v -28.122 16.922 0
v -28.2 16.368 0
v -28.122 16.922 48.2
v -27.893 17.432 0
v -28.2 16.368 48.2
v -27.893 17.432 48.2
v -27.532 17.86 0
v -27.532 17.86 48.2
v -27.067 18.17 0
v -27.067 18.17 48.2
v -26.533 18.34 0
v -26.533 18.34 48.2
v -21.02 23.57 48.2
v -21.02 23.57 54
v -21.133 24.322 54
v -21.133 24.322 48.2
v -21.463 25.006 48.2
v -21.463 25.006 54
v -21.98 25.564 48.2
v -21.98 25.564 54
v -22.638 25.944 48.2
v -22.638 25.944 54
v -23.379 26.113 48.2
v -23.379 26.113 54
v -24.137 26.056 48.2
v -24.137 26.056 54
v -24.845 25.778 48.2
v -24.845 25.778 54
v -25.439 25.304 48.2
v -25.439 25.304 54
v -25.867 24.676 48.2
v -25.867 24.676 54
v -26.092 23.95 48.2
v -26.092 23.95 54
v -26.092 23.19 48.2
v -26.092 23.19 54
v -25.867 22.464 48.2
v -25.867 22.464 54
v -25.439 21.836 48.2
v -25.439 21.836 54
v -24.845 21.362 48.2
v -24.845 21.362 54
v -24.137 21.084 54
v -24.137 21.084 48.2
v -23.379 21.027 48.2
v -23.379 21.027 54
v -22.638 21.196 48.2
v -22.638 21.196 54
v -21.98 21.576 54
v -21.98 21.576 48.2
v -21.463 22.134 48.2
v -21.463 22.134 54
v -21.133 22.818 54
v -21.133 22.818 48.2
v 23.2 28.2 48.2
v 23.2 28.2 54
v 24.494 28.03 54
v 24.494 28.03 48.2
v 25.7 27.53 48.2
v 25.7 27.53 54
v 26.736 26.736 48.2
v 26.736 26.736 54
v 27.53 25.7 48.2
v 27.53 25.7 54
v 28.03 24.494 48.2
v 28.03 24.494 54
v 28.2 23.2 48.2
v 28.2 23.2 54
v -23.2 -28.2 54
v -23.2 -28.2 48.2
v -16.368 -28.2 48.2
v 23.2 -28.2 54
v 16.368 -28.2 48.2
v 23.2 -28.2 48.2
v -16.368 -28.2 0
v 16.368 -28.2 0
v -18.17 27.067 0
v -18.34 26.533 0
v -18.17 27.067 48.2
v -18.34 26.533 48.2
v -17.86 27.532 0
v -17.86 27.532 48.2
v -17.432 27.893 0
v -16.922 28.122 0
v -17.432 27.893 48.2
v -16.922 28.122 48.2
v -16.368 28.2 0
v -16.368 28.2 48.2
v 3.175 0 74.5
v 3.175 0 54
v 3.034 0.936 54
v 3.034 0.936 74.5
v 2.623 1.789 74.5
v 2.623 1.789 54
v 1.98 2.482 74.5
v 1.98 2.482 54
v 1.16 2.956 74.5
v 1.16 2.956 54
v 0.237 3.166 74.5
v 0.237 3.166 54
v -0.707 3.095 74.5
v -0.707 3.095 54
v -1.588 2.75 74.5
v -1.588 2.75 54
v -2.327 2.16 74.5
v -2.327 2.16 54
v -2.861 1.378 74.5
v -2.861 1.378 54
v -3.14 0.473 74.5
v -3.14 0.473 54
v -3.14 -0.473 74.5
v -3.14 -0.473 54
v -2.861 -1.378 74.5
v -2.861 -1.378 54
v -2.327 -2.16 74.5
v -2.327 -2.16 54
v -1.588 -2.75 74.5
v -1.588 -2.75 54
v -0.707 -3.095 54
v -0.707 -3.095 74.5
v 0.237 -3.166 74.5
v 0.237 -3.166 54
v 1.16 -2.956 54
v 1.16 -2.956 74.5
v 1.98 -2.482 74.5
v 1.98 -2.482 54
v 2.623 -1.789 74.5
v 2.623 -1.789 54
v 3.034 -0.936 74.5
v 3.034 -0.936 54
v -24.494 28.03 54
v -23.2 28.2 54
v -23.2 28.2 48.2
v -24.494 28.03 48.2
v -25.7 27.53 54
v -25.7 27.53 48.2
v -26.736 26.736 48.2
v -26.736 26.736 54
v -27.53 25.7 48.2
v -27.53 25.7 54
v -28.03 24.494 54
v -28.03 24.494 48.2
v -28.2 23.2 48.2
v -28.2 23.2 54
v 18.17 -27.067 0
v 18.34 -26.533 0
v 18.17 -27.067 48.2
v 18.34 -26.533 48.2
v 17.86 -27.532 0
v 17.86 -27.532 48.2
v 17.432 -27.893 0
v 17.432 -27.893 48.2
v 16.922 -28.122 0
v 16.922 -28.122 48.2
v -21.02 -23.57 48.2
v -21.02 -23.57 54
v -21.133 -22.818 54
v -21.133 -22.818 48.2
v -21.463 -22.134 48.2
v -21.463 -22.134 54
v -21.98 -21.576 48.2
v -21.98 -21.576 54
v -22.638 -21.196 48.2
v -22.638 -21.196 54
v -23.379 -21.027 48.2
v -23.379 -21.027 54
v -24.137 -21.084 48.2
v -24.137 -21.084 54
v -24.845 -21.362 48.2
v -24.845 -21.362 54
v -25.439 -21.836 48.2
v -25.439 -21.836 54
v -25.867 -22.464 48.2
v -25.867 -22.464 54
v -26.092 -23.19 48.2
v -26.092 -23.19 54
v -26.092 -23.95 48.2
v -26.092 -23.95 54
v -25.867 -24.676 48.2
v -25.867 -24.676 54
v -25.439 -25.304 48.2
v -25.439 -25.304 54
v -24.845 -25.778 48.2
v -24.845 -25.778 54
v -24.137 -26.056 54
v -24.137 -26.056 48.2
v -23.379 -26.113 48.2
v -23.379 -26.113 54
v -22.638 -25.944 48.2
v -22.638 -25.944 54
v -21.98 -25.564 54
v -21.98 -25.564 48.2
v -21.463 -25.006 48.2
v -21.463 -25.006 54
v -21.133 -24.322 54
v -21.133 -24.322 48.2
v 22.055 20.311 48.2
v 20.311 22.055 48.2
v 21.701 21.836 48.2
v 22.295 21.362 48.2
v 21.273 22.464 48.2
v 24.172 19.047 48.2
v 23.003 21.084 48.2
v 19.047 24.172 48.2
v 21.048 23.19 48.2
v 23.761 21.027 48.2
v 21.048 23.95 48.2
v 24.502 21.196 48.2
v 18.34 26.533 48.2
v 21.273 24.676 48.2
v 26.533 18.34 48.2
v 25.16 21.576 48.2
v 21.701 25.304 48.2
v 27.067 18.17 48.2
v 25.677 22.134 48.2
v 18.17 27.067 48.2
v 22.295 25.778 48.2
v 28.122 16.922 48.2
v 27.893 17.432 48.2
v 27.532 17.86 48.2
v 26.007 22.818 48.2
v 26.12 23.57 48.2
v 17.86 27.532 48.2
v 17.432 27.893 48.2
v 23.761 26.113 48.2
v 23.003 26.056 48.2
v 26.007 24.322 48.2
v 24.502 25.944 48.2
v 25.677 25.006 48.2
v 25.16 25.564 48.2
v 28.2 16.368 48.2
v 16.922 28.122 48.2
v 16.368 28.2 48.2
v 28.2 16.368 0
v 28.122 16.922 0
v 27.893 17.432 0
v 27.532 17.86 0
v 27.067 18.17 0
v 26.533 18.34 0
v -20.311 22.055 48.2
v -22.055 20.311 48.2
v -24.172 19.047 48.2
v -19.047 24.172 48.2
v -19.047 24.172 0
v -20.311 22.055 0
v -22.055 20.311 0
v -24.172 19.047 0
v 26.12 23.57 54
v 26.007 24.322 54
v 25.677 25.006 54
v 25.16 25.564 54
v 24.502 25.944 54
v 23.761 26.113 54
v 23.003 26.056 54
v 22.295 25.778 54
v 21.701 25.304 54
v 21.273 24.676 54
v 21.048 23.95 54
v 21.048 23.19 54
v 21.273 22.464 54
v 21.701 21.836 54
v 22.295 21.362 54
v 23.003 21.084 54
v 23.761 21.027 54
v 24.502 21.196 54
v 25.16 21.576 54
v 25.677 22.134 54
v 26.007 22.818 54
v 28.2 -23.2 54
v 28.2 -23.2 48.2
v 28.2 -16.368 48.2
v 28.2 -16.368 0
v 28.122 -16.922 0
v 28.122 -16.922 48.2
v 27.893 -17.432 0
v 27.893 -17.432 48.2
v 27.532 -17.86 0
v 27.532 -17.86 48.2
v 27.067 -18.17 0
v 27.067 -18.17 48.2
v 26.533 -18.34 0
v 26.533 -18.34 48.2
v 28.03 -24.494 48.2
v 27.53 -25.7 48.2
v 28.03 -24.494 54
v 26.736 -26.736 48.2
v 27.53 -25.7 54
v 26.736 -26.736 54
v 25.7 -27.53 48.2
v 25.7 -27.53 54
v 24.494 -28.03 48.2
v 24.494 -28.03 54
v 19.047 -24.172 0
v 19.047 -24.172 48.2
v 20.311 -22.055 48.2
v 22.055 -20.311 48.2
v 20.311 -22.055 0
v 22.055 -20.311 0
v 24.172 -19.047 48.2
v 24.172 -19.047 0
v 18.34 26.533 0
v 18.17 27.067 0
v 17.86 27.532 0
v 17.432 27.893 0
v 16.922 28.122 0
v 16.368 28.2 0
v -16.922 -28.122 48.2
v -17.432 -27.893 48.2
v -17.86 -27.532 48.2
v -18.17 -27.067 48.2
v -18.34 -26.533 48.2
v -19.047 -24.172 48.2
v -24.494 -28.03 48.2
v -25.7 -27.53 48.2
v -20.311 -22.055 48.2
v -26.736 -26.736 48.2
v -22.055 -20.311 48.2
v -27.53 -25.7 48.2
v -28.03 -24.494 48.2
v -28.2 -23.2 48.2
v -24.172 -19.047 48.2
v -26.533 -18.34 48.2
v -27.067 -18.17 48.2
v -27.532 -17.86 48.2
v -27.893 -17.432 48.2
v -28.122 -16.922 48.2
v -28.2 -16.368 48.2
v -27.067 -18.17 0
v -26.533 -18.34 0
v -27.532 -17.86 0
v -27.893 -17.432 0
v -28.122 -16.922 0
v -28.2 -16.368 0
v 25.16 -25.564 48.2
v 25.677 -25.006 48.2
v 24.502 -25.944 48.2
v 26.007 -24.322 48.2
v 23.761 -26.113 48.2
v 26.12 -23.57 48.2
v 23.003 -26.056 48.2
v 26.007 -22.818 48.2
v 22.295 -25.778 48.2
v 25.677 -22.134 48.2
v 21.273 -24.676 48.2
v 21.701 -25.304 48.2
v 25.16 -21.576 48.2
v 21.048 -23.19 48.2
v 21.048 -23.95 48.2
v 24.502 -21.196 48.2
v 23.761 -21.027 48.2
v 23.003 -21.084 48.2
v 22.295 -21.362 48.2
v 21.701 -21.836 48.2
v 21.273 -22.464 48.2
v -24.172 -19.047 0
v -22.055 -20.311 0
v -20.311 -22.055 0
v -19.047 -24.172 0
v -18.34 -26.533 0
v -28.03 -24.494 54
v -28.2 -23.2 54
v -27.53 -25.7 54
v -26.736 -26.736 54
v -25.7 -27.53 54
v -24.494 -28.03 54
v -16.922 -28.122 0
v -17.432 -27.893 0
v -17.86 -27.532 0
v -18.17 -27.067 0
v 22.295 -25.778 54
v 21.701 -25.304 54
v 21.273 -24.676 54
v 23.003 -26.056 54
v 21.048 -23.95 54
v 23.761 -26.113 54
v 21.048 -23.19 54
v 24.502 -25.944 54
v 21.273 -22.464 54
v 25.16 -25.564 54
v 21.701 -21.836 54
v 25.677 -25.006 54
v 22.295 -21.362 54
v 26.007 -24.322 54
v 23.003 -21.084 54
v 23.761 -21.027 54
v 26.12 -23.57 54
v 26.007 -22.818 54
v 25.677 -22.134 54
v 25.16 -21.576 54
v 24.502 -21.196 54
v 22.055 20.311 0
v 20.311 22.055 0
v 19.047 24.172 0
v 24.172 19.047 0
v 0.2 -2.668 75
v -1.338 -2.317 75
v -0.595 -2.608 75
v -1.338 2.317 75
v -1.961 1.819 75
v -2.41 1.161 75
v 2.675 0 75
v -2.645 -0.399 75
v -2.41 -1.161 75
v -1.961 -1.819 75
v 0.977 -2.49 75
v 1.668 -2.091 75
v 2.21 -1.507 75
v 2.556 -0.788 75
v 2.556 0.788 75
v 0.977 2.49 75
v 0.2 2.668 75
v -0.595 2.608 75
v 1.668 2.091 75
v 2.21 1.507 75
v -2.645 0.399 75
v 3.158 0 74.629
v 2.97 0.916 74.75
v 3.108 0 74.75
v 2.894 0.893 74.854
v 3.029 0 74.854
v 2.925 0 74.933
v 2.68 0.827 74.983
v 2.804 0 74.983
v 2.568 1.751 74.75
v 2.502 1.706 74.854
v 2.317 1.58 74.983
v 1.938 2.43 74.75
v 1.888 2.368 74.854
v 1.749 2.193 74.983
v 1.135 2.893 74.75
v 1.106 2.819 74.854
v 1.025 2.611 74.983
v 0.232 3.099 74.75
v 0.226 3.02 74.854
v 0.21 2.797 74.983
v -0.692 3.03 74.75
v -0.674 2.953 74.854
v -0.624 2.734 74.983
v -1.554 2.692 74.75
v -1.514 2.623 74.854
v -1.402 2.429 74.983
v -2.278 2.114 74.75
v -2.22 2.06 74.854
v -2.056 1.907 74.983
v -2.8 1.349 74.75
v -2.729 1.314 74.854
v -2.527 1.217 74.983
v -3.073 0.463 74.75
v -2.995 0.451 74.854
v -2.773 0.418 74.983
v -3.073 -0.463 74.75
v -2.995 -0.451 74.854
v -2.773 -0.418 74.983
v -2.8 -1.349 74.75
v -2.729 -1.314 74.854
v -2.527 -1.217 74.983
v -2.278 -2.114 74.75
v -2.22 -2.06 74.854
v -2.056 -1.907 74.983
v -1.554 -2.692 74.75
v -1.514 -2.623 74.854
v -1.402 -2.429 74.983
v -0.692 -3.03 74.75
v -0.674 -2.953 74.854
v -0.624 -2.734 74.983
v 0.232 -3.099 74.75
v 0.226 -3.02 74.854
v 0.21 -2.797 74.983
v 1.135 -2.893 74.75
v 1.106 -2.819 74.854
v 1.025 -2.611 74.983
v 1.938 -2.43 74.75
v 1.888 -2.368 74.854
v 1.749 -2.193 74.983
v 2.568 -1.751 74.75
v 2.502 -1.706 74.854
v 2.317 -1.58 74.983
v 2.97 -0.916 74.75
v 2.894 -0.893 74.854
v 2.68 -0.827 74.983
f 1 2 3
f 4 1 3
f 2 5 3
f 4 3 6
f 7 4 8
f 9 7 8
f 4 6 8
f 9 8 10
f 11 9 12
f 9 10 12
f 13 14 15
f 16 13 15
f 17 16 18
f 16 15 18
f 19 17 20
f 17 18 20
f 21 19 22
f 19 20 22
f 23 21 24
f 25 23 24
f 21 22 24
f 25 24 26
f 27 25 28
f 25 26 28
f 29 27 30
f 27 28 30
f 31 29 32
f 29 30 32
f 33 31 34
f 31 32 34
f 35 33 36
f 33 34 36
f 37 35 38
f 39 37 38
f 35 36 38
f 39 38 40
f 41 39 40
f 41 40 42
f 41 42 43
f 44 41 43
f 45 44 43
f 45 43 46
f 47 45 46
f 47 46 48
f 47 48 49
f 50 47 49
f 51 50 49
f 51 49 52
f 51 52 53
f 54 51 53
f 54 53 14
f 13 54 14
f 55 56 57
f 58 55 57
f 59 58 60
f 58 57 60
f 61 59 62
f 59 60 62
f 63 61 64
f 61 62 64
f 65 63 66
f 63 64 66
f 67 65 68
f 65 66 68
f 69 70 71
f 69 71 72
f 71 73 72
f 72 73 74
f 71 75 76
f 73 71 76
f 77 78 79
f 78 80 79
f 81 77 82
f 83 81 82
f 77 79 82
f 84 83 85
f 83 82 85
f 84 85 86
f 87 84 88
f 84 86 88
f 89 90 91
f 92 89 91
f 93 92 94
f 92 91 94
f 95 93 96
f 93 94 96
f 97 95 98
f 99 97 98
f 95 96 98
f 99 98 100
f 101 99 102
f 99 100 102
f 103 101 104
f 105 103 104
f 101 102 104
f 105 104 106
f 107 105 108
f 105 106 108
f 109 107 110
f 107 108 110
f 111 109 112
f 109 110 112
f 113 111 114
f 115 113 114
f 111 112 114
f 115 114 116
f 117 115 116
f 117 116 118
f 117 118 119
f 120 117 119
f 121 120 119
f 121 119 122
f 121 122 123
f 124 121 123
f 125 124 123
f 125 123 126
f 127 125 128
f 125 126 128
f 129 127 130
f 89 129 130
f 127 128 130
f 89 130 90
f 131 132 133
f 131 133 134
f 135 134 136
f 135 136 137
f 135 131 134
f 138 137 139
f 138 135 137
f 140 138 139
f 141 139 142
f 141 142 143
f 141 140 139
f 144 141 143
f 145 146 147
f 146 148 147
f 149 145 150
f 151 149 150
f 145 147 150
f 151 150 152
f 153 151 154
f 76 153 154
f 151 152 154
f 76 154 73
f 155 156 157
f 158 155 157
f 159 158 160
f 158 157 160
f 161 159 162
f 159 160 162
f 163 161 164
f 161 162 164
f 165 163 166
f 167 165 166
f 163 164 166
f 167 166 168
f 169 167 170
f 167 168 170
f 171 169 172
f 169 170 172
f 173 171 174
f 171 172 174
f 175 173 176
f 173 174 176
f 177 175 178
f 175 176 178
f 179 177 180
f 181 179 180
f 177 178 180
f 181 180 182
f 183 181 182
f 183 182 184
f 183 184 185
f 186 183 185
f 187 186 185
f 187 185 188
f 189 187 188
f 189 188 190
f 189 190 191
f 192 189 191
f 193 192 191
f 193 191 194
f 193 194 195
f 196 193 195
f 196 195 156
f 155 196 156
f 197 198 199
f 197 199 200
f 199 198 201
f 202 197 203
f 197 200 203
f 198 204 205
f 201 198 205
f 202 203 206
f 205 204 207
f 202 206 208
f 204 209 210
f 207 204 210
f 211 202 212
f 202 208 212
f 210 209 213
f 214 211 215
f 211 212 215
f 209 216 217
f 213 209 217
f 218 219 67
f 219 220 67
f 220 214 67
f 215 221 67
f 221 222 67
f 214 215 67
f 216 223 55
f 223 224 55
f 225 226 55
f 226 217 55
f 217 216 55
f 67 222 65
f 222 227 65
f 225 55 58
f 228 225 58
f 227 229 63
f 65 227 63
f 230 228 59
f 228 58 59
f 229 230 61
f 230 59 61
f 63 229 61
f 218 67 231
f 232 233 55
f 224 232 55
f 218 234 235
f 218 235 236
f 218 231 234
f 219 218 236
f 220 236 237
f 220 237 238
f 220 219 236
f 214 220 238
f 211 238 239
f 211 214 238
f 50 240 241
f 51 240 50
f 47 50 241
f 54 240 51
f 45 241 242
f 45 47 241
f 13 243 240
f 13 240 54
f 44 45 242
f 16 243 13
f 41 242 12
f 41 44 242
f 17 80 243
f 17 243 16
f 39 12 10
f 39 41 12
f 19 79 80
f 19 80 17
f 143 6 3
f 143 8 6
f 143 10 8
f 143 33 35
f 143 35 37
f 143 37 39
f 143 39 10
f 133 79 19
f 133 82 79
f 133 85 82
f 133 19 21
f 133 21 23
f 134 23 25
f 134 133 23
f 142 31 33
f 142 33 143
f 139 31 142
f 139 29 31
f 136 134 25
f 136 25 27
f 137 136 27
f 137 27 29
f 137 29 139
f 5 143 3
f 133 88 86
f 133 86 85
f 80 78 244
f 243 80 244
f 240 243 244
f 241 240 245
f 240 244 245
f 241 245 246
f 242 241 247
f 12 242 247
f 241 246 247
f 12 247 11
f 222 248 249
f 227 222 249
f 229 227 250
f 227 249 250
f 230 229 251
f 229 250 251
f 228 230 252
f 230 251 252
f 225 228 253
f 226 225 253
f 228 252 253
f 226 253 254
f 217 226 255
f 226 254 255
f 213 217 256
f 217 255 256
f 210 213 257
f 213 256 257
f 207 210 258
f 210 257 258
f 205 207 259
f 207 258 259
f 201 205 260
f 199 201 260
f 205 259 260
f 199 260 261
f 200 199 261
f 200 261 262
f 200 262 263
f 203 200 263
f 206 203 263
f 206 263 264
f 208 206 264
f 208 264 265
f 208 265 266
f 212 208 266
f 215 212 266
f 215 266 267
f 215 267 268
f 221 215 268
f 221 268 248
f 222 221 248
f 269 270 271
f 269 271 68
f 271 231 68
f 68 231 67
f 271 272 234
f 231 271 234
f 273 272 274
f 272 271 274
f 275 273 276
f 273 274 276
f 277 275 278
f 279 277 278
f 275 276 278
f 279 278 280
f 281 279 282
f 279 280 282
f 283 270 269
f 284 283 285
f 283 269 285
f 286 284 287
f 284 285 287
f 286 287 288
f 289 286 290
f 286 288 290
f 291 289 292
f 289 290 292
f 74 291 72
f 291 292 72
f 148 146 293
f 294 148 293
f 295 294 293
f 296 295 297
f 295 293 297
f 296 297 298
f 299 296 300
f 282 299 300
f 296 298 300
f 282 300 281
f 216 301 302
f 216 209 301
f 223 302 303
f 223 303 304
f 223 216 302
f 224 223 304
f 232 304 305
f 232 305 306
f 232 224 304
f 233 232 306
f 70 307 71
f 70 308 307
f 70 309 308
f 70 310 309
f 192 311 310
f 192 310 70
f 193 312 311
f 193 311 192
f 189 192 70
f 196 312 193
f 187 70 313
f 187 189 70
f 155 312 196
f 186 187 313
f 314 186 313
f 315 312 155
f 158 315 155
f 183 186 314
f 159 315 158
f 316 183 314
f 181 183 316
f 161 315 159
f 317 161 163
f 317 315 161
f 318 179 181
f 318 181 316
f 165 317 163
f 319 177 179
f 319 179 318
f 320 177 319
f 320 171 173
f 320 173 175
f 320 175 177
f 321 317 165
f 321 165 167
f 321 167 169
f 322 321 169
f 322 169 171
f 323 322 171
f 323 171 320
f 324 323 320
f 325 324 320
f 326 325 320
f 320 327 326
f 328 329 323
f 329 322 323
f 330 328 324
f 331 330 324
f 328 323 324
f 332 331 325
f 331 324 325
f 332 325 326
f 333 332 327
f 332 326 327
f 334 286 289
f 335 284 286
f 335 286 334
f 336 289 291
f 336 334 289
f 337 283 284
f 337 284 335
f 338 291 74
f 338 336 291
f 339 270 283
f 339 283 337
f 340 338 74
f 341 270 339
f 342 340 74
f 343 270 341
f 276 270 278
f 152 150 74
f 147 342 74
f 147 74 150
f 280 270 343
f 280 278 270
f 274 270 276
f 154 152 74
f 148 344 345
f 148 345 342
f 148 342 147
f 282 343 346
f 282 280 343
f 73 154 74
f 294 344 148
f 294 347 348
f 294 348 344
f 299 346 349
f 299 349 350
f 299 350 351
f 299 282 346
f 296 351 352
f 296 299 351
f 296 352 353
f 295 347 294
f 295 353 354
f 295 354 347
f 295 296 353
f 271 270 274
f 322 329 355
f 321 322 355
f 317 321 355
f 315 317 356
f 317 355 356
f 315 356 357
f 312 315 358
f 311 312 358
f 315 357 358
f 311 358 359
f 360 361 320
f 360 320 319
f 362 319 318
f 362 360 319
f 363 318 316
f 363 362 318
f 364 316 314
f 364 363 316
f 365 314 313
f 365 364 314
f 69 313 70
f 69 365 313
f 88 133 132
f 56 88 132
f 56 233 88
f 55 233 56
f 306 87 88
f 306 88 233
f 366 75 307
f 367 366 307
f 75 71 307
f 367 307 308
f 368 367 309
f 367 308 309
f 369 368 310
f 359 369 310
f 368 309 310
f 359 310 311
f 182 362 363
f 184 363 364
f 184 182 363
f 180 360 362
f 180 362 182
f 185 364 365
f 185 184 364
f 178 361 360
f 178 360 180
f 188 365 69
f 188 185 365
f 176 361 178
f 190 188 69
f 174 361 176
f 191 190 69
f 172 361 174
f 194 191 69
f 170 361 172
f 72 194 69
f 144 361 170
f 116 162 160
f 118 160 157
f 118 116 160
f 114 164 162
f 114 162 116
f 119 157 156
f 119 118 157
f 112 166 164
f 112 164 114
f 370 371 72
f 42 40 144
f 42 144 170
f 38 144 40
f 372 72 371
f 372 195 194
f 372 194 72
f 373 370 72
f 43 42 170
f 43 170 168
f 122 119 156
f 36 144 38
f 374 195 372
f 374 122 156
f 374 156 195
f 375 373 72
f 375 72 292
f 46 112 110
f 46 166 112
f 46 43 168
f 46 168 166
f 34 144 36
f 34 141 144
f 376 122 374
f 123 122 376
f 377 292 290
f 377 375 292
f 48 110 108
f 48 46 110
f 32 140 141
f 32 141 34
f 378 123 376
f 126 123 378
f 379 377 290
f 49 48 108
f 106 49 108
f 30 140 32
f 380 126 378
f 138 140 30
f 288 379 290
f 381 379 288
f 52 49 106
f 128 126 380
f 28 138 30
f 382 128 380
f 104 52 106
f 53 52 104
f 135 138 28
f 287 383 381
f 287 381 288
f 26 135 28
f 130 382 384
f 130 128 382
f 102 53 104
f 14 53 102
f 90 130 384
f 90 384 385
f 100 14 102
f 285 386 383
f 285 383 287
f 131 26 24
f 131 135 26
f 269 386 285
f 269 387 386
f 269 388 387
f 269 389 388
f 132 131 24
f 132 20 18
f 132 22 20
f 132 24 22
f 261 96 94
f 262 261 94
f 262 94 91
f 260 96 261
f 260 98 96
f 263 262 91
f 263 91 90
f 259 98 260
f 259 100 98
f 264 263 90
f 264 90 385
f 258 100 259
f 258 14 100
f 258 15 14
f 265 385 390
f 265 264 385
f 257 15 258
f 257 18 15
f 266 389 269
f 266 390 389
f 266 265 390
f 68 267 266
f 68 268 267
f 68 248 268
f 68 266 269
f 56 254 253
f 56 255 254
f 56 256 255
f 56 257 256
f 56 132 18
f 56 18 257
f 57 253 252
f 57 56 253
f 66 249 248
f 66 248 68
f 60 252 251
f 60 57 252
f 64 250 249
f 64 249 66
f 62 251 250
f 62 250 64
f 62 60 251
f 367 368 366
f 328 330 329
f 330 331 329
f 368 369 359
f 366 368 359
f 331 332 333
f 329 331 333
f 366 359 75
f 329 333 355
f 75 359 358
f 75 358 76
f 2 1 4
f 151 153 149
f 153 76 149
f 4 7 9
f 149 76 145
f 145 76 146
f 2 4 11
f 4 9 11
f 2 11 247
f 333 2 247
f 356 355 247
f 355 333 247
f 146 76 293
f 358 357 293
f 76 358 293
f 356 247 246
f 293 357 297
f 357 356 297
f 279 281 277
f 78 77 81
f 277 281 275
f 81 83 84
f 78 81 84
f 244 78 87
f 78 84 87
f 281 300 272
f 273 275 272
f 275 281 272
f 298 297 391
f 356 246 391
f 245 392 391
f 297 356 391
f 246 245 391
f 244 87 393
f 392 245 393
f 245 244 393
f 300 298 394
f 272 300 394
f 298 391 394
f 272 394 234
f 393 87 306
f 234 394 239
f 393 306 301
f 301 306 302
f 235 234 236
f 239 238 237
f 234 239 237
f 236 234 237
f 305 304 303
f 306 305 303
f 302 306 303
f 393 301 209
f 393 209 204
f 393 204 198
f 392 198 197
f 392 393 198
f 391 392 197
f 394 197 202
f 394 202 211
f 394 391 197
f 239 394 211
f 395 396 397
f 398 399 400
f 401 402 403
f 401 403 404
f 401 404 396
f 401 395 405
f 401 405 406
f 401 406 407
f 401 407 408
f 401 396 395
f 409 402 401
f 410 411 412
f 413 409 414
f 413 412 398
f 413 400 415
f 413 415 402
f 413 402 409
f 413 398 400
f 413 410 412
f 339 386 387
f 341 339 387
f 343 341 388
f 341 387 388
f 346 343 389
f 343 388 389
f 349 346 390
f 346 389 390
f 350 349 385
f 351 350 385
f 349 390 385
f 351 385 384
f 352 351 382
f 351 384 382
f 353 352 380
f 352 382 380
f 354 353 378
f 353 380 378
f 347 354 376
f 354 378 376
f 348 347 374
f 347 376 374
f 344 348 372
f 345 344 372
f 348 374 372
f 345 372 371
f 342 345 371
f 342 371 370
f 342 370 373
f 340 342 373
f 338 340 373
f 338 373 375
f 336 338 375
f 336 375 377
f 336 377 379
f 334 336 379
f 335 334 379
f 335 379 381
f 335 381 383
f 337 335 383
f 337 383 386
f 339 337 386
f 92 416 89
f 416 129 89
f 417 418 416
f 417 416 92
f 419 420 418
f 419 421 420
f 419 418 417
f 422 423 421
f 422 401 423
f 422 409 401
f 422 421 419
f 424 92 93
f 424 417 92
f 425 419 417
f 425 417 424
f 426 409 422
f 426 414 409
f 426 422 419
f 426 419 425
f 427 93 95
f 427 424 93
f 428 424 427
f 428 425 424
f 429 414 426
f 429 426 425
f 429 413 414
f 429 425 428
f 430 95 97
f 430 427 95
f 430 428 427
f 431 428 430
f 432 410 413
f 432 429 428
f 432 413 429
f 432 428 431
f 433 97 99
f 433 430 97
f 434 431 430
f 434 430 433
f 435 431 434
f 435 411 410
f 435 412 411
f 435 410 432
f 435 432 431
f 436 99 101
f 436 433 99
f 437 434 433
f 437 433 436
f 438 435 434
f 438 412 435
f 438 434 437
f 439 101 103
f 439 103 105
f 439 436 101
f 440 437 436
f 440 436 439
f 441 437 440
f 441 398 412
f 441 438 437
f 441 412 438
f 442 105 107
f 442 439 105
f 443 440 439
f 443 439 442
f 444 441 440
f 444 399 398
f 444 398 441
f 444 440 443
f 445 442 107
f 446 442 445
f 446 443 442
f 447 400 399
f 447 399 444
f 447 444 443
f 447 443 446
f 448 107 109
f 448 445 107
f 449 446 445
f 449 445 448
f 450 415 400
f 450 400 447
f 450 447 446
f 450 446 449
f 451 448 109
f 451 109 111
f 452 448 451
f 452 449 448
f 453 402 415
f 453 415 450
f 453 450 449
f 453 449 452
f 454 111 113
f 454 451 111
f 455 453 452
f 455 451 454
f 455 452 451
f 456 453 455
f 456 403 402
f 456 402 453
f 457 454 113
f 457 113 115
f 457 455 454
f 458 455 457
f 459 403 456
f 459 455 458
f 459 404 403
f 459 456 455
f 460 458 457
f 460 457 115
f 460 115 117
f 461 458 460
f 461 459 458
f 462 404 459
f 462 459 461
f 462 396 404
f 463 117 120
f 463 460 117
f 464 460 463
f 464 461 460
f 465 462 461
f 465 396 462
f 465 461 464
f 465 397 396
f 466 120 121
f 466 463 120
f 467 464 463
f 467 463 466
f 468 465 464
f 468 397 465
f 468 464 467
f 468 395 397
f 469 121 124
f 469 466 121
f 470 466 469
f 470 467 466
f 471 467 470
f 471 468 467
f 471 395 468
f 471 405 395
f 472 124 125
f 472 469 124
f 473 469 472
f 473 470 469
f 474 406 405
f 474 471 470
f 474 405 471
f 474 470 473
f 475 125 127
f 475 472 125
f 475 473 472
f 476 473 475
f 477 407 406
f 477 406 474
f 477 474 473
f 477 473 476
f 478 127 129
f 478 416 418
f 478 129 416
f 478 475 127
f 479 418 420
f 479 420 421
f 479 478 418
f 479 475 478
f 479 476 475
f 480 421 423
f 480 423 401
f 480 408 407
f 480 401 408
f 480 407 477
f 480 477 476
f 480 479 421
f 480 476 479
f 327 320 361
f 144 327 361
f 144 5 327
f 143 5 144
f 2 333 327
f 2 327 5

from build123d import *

# Parameters (mm, degrees)
ESQUISSE2_W             = 56.4
ESQUISSE2_H             = 56.4
BOSS_EXTRU_2_DEPTH      = 54
ESQUISSE3_R             = 2.55
ENL_V_MAT_EXTRU_1_DEPTH = 54
CONG_2_R                = 5
CONG_3_R                = 5
CONG_4_R                = 5
CONG_6_R                = 5
ESQUISSE4_R             = 2.55
ENL_V_MAT_EXTRU_2_DEPTH = 48.2
CONG_7_R                = 2
CONG_8_R                = 2
CONG_9_R                = 2
CONG_10_R               = 2
CONG_11_R               = 2
CONG_12_R               = 2
CONG_13_R               = 2
CONG_14_R               = 2
ESQUISSE5_R             = 3.175
BOSS_EXTRU_3_DEPTH      = 21
CONG_15_R               = 0.5


with BuildPart() as part:
    # Esquisse2 → Boss.-Extru.2 (new body)
    with BuildSketch(Plane.XY):
        Rectangle(ESQUISSE2_W, ESQUISSE2_H)
    extrude(amount=BOSS_EXTRU_2_DEPTH)

    # Esquisse3 → Enlèv. mat.-Extru.1 (cut)
    with BuildSketch(Plane.XY.offset(54)):
        with Locations((-23.57, 23.57)):
            Circle(ESQUISSE3_R)
        with Locations((23.57, 23.57)):
            Circle(ESQUISSE3_R)
        with Locations((23.57, -23.57)):
            Circle(ESQUISSE3_R)
        with Locations((-23.57, -23.57)):
            Circle(ESQUISSE3_R)
    extrude(amount=-ENL_V_MAT_EXTRU_1_DEPTH, mode=Mode.SUBTRACT)

    # Congé2
    cong_2_edges = [part.edges().sort_by_distance(p)[0] for p in [
        (28.2, 28.2, 27),
    ]]
    fillet(cong_2_edges, radius=CONG_2_R)

    # Congé3
    cong_3_edges = [part.edges().sort_by_distance(p)[0] for p in [
        (28.2, -28.2, 27),
    ]]
    fillet(cong_3_edges, radius=CONG_3_R)

    # Congé4
    cong_4_edges = [part.edges().sort_by_distance(p)[0] for p in [
        (-28.2, 28.2, 27),
    ]]
    fillet(cong_4_edges, radius=CONG_4_R)

    # Congé6
    cong_6_edges = [part.edges().sort_by_distance(p)[0] for p in [
        (-28.2, -28.2, 27),
    ]]
    fillet(cong_6_edges, radius=CONG_6_R)

    # Esquisse4 → Enlèv. mat.-Extru.2 (cut)
    with BuildSketch(Plane(origin=(0, 0, 0), x_dir=(-1, 0, 0), z_dir=(0, 0, -1))):
        with BuildLine():
            ThreePointArc((-18.2, -28.2), (-21.128932188, -21.128932188), (-28.2, -18.2))
            Line((-28.2, -18.2), (-28.2, -23.2))
            ThreePointArc((-28.2, -23.2), (-26.735533906, -26.735533906), (-23.2, -28.2))
            Line((-23.2, -28.2), (-18.2, -28.2))
        make_face()
        with Locations((-23.57, -23.57)):
            Circle(ESQUISSE4_R, mode=Mode.SUBTRACT)
        with BuildLine():
            Line((-28.2, 28.2), (-18.2, 28.2))
            ThreePointArc((-18.2, 28.2), (-21.128932188, 21.128932188), (-28.2, 18.2))
            Line((-28.2, 18.2), (-28.2, 28.2))
        make_face()
        with BuildLine():
            ThreePointArc((28.2, -18.2), (21.128932188, -21.128932188), (18.2, -28.2))
            Line((18.2, -28.2), (28.2, -28.2))
            Line((28.2, -28.2), (28.2, -18.2))
        make_face()
        with BuildLine():
            ThreePointArc((18.2, 28.2), (21.128932188, 21.128932188), (28.2, 18.2))
            Line((28.2, 18.2), (28.2, 28.2))
            Line((28.2, 28.2), (18.2, 28.2))
        make_face()
    extrude(amount=-ENL_V_MAT_EXTRU_2_DEPTH, mode=Mode.SUBTRACT)

    # Congé7
    cong_7_edges = [part.edges().sort_by_distance(p)[0] for p in [
        (18.2, 28.2, 24.1),
    ]]
    fillet(cong_7_edges, radius=CONG_7_R)

    # Congé8
    cong_8_edges = [part.edges().sort_by_distance(p)[0] for p in [
        (28.2, 18.2, 24.1),
    ]]
    fillet(cong_8_edges, radius=CONG_8_R)

    # Congé9
    cong_9_edges = [part.edges().sort_by_distance(p)[0] for p in [
        (-18.2, 28.2, 24.1),
    ]]
    fillet(cong_9_edges, radius=CONG_9_R)

    # Congé10
    cong_10_edges = [part.edges().sort_by_distance(p)[0] for p in [
        (-28.2, 18.2, 24.1),
    ]]
    fillet(cong_10_edges, radius=CONG_10_R)

    # Congé11
    cong_11_edges = [part.edges().sort_by_distance(p)[0] for p in [
        (-28.2, -18.2, 24.1),
    ]]
    fillet(cong_11_edges, radius=CONG_11_R)

    # Congé12
    cong_12_edges = [part.edges().sort_by_distance(p)[0] for p in [
        (-18.2, -28.2, 24.1),
    ]]
    fillet(cong_12_edges, radius=CONG_12_R)

    # Congé13
    cong_13_edges = [part.edges().sort_by_distance(p)[0] for p in [
        (18.2, -28.2, 24.1),
    ]]
    fillet(cong_13_edges, radius=CONG_13_R)

    # Congé14
    cong_14_edges = [part.edges().sort_by_distance(p)[0] for p in [
        (28.2, -18.2, 24.1),
    ]]
    fillet(cong_14_edges, radius=CONG_14_R)

    # Esquisse5 → Boss.-Extru.3 (add)
    with BuildSketch(Plane.XY.offset(54)):
        Circle(ESQUISSE5_R)
    extrude(amount=BOSS_EXTRU_3_DEPTH)

    # Congé15
    cong_15_edges = [part.edges().sort_by_distance(p)[0] for p in [
        (-3.175, 0, 75),
    ]]
    fillet(cong_15_edges, radius=CONG_15_R)


solid = part.part
